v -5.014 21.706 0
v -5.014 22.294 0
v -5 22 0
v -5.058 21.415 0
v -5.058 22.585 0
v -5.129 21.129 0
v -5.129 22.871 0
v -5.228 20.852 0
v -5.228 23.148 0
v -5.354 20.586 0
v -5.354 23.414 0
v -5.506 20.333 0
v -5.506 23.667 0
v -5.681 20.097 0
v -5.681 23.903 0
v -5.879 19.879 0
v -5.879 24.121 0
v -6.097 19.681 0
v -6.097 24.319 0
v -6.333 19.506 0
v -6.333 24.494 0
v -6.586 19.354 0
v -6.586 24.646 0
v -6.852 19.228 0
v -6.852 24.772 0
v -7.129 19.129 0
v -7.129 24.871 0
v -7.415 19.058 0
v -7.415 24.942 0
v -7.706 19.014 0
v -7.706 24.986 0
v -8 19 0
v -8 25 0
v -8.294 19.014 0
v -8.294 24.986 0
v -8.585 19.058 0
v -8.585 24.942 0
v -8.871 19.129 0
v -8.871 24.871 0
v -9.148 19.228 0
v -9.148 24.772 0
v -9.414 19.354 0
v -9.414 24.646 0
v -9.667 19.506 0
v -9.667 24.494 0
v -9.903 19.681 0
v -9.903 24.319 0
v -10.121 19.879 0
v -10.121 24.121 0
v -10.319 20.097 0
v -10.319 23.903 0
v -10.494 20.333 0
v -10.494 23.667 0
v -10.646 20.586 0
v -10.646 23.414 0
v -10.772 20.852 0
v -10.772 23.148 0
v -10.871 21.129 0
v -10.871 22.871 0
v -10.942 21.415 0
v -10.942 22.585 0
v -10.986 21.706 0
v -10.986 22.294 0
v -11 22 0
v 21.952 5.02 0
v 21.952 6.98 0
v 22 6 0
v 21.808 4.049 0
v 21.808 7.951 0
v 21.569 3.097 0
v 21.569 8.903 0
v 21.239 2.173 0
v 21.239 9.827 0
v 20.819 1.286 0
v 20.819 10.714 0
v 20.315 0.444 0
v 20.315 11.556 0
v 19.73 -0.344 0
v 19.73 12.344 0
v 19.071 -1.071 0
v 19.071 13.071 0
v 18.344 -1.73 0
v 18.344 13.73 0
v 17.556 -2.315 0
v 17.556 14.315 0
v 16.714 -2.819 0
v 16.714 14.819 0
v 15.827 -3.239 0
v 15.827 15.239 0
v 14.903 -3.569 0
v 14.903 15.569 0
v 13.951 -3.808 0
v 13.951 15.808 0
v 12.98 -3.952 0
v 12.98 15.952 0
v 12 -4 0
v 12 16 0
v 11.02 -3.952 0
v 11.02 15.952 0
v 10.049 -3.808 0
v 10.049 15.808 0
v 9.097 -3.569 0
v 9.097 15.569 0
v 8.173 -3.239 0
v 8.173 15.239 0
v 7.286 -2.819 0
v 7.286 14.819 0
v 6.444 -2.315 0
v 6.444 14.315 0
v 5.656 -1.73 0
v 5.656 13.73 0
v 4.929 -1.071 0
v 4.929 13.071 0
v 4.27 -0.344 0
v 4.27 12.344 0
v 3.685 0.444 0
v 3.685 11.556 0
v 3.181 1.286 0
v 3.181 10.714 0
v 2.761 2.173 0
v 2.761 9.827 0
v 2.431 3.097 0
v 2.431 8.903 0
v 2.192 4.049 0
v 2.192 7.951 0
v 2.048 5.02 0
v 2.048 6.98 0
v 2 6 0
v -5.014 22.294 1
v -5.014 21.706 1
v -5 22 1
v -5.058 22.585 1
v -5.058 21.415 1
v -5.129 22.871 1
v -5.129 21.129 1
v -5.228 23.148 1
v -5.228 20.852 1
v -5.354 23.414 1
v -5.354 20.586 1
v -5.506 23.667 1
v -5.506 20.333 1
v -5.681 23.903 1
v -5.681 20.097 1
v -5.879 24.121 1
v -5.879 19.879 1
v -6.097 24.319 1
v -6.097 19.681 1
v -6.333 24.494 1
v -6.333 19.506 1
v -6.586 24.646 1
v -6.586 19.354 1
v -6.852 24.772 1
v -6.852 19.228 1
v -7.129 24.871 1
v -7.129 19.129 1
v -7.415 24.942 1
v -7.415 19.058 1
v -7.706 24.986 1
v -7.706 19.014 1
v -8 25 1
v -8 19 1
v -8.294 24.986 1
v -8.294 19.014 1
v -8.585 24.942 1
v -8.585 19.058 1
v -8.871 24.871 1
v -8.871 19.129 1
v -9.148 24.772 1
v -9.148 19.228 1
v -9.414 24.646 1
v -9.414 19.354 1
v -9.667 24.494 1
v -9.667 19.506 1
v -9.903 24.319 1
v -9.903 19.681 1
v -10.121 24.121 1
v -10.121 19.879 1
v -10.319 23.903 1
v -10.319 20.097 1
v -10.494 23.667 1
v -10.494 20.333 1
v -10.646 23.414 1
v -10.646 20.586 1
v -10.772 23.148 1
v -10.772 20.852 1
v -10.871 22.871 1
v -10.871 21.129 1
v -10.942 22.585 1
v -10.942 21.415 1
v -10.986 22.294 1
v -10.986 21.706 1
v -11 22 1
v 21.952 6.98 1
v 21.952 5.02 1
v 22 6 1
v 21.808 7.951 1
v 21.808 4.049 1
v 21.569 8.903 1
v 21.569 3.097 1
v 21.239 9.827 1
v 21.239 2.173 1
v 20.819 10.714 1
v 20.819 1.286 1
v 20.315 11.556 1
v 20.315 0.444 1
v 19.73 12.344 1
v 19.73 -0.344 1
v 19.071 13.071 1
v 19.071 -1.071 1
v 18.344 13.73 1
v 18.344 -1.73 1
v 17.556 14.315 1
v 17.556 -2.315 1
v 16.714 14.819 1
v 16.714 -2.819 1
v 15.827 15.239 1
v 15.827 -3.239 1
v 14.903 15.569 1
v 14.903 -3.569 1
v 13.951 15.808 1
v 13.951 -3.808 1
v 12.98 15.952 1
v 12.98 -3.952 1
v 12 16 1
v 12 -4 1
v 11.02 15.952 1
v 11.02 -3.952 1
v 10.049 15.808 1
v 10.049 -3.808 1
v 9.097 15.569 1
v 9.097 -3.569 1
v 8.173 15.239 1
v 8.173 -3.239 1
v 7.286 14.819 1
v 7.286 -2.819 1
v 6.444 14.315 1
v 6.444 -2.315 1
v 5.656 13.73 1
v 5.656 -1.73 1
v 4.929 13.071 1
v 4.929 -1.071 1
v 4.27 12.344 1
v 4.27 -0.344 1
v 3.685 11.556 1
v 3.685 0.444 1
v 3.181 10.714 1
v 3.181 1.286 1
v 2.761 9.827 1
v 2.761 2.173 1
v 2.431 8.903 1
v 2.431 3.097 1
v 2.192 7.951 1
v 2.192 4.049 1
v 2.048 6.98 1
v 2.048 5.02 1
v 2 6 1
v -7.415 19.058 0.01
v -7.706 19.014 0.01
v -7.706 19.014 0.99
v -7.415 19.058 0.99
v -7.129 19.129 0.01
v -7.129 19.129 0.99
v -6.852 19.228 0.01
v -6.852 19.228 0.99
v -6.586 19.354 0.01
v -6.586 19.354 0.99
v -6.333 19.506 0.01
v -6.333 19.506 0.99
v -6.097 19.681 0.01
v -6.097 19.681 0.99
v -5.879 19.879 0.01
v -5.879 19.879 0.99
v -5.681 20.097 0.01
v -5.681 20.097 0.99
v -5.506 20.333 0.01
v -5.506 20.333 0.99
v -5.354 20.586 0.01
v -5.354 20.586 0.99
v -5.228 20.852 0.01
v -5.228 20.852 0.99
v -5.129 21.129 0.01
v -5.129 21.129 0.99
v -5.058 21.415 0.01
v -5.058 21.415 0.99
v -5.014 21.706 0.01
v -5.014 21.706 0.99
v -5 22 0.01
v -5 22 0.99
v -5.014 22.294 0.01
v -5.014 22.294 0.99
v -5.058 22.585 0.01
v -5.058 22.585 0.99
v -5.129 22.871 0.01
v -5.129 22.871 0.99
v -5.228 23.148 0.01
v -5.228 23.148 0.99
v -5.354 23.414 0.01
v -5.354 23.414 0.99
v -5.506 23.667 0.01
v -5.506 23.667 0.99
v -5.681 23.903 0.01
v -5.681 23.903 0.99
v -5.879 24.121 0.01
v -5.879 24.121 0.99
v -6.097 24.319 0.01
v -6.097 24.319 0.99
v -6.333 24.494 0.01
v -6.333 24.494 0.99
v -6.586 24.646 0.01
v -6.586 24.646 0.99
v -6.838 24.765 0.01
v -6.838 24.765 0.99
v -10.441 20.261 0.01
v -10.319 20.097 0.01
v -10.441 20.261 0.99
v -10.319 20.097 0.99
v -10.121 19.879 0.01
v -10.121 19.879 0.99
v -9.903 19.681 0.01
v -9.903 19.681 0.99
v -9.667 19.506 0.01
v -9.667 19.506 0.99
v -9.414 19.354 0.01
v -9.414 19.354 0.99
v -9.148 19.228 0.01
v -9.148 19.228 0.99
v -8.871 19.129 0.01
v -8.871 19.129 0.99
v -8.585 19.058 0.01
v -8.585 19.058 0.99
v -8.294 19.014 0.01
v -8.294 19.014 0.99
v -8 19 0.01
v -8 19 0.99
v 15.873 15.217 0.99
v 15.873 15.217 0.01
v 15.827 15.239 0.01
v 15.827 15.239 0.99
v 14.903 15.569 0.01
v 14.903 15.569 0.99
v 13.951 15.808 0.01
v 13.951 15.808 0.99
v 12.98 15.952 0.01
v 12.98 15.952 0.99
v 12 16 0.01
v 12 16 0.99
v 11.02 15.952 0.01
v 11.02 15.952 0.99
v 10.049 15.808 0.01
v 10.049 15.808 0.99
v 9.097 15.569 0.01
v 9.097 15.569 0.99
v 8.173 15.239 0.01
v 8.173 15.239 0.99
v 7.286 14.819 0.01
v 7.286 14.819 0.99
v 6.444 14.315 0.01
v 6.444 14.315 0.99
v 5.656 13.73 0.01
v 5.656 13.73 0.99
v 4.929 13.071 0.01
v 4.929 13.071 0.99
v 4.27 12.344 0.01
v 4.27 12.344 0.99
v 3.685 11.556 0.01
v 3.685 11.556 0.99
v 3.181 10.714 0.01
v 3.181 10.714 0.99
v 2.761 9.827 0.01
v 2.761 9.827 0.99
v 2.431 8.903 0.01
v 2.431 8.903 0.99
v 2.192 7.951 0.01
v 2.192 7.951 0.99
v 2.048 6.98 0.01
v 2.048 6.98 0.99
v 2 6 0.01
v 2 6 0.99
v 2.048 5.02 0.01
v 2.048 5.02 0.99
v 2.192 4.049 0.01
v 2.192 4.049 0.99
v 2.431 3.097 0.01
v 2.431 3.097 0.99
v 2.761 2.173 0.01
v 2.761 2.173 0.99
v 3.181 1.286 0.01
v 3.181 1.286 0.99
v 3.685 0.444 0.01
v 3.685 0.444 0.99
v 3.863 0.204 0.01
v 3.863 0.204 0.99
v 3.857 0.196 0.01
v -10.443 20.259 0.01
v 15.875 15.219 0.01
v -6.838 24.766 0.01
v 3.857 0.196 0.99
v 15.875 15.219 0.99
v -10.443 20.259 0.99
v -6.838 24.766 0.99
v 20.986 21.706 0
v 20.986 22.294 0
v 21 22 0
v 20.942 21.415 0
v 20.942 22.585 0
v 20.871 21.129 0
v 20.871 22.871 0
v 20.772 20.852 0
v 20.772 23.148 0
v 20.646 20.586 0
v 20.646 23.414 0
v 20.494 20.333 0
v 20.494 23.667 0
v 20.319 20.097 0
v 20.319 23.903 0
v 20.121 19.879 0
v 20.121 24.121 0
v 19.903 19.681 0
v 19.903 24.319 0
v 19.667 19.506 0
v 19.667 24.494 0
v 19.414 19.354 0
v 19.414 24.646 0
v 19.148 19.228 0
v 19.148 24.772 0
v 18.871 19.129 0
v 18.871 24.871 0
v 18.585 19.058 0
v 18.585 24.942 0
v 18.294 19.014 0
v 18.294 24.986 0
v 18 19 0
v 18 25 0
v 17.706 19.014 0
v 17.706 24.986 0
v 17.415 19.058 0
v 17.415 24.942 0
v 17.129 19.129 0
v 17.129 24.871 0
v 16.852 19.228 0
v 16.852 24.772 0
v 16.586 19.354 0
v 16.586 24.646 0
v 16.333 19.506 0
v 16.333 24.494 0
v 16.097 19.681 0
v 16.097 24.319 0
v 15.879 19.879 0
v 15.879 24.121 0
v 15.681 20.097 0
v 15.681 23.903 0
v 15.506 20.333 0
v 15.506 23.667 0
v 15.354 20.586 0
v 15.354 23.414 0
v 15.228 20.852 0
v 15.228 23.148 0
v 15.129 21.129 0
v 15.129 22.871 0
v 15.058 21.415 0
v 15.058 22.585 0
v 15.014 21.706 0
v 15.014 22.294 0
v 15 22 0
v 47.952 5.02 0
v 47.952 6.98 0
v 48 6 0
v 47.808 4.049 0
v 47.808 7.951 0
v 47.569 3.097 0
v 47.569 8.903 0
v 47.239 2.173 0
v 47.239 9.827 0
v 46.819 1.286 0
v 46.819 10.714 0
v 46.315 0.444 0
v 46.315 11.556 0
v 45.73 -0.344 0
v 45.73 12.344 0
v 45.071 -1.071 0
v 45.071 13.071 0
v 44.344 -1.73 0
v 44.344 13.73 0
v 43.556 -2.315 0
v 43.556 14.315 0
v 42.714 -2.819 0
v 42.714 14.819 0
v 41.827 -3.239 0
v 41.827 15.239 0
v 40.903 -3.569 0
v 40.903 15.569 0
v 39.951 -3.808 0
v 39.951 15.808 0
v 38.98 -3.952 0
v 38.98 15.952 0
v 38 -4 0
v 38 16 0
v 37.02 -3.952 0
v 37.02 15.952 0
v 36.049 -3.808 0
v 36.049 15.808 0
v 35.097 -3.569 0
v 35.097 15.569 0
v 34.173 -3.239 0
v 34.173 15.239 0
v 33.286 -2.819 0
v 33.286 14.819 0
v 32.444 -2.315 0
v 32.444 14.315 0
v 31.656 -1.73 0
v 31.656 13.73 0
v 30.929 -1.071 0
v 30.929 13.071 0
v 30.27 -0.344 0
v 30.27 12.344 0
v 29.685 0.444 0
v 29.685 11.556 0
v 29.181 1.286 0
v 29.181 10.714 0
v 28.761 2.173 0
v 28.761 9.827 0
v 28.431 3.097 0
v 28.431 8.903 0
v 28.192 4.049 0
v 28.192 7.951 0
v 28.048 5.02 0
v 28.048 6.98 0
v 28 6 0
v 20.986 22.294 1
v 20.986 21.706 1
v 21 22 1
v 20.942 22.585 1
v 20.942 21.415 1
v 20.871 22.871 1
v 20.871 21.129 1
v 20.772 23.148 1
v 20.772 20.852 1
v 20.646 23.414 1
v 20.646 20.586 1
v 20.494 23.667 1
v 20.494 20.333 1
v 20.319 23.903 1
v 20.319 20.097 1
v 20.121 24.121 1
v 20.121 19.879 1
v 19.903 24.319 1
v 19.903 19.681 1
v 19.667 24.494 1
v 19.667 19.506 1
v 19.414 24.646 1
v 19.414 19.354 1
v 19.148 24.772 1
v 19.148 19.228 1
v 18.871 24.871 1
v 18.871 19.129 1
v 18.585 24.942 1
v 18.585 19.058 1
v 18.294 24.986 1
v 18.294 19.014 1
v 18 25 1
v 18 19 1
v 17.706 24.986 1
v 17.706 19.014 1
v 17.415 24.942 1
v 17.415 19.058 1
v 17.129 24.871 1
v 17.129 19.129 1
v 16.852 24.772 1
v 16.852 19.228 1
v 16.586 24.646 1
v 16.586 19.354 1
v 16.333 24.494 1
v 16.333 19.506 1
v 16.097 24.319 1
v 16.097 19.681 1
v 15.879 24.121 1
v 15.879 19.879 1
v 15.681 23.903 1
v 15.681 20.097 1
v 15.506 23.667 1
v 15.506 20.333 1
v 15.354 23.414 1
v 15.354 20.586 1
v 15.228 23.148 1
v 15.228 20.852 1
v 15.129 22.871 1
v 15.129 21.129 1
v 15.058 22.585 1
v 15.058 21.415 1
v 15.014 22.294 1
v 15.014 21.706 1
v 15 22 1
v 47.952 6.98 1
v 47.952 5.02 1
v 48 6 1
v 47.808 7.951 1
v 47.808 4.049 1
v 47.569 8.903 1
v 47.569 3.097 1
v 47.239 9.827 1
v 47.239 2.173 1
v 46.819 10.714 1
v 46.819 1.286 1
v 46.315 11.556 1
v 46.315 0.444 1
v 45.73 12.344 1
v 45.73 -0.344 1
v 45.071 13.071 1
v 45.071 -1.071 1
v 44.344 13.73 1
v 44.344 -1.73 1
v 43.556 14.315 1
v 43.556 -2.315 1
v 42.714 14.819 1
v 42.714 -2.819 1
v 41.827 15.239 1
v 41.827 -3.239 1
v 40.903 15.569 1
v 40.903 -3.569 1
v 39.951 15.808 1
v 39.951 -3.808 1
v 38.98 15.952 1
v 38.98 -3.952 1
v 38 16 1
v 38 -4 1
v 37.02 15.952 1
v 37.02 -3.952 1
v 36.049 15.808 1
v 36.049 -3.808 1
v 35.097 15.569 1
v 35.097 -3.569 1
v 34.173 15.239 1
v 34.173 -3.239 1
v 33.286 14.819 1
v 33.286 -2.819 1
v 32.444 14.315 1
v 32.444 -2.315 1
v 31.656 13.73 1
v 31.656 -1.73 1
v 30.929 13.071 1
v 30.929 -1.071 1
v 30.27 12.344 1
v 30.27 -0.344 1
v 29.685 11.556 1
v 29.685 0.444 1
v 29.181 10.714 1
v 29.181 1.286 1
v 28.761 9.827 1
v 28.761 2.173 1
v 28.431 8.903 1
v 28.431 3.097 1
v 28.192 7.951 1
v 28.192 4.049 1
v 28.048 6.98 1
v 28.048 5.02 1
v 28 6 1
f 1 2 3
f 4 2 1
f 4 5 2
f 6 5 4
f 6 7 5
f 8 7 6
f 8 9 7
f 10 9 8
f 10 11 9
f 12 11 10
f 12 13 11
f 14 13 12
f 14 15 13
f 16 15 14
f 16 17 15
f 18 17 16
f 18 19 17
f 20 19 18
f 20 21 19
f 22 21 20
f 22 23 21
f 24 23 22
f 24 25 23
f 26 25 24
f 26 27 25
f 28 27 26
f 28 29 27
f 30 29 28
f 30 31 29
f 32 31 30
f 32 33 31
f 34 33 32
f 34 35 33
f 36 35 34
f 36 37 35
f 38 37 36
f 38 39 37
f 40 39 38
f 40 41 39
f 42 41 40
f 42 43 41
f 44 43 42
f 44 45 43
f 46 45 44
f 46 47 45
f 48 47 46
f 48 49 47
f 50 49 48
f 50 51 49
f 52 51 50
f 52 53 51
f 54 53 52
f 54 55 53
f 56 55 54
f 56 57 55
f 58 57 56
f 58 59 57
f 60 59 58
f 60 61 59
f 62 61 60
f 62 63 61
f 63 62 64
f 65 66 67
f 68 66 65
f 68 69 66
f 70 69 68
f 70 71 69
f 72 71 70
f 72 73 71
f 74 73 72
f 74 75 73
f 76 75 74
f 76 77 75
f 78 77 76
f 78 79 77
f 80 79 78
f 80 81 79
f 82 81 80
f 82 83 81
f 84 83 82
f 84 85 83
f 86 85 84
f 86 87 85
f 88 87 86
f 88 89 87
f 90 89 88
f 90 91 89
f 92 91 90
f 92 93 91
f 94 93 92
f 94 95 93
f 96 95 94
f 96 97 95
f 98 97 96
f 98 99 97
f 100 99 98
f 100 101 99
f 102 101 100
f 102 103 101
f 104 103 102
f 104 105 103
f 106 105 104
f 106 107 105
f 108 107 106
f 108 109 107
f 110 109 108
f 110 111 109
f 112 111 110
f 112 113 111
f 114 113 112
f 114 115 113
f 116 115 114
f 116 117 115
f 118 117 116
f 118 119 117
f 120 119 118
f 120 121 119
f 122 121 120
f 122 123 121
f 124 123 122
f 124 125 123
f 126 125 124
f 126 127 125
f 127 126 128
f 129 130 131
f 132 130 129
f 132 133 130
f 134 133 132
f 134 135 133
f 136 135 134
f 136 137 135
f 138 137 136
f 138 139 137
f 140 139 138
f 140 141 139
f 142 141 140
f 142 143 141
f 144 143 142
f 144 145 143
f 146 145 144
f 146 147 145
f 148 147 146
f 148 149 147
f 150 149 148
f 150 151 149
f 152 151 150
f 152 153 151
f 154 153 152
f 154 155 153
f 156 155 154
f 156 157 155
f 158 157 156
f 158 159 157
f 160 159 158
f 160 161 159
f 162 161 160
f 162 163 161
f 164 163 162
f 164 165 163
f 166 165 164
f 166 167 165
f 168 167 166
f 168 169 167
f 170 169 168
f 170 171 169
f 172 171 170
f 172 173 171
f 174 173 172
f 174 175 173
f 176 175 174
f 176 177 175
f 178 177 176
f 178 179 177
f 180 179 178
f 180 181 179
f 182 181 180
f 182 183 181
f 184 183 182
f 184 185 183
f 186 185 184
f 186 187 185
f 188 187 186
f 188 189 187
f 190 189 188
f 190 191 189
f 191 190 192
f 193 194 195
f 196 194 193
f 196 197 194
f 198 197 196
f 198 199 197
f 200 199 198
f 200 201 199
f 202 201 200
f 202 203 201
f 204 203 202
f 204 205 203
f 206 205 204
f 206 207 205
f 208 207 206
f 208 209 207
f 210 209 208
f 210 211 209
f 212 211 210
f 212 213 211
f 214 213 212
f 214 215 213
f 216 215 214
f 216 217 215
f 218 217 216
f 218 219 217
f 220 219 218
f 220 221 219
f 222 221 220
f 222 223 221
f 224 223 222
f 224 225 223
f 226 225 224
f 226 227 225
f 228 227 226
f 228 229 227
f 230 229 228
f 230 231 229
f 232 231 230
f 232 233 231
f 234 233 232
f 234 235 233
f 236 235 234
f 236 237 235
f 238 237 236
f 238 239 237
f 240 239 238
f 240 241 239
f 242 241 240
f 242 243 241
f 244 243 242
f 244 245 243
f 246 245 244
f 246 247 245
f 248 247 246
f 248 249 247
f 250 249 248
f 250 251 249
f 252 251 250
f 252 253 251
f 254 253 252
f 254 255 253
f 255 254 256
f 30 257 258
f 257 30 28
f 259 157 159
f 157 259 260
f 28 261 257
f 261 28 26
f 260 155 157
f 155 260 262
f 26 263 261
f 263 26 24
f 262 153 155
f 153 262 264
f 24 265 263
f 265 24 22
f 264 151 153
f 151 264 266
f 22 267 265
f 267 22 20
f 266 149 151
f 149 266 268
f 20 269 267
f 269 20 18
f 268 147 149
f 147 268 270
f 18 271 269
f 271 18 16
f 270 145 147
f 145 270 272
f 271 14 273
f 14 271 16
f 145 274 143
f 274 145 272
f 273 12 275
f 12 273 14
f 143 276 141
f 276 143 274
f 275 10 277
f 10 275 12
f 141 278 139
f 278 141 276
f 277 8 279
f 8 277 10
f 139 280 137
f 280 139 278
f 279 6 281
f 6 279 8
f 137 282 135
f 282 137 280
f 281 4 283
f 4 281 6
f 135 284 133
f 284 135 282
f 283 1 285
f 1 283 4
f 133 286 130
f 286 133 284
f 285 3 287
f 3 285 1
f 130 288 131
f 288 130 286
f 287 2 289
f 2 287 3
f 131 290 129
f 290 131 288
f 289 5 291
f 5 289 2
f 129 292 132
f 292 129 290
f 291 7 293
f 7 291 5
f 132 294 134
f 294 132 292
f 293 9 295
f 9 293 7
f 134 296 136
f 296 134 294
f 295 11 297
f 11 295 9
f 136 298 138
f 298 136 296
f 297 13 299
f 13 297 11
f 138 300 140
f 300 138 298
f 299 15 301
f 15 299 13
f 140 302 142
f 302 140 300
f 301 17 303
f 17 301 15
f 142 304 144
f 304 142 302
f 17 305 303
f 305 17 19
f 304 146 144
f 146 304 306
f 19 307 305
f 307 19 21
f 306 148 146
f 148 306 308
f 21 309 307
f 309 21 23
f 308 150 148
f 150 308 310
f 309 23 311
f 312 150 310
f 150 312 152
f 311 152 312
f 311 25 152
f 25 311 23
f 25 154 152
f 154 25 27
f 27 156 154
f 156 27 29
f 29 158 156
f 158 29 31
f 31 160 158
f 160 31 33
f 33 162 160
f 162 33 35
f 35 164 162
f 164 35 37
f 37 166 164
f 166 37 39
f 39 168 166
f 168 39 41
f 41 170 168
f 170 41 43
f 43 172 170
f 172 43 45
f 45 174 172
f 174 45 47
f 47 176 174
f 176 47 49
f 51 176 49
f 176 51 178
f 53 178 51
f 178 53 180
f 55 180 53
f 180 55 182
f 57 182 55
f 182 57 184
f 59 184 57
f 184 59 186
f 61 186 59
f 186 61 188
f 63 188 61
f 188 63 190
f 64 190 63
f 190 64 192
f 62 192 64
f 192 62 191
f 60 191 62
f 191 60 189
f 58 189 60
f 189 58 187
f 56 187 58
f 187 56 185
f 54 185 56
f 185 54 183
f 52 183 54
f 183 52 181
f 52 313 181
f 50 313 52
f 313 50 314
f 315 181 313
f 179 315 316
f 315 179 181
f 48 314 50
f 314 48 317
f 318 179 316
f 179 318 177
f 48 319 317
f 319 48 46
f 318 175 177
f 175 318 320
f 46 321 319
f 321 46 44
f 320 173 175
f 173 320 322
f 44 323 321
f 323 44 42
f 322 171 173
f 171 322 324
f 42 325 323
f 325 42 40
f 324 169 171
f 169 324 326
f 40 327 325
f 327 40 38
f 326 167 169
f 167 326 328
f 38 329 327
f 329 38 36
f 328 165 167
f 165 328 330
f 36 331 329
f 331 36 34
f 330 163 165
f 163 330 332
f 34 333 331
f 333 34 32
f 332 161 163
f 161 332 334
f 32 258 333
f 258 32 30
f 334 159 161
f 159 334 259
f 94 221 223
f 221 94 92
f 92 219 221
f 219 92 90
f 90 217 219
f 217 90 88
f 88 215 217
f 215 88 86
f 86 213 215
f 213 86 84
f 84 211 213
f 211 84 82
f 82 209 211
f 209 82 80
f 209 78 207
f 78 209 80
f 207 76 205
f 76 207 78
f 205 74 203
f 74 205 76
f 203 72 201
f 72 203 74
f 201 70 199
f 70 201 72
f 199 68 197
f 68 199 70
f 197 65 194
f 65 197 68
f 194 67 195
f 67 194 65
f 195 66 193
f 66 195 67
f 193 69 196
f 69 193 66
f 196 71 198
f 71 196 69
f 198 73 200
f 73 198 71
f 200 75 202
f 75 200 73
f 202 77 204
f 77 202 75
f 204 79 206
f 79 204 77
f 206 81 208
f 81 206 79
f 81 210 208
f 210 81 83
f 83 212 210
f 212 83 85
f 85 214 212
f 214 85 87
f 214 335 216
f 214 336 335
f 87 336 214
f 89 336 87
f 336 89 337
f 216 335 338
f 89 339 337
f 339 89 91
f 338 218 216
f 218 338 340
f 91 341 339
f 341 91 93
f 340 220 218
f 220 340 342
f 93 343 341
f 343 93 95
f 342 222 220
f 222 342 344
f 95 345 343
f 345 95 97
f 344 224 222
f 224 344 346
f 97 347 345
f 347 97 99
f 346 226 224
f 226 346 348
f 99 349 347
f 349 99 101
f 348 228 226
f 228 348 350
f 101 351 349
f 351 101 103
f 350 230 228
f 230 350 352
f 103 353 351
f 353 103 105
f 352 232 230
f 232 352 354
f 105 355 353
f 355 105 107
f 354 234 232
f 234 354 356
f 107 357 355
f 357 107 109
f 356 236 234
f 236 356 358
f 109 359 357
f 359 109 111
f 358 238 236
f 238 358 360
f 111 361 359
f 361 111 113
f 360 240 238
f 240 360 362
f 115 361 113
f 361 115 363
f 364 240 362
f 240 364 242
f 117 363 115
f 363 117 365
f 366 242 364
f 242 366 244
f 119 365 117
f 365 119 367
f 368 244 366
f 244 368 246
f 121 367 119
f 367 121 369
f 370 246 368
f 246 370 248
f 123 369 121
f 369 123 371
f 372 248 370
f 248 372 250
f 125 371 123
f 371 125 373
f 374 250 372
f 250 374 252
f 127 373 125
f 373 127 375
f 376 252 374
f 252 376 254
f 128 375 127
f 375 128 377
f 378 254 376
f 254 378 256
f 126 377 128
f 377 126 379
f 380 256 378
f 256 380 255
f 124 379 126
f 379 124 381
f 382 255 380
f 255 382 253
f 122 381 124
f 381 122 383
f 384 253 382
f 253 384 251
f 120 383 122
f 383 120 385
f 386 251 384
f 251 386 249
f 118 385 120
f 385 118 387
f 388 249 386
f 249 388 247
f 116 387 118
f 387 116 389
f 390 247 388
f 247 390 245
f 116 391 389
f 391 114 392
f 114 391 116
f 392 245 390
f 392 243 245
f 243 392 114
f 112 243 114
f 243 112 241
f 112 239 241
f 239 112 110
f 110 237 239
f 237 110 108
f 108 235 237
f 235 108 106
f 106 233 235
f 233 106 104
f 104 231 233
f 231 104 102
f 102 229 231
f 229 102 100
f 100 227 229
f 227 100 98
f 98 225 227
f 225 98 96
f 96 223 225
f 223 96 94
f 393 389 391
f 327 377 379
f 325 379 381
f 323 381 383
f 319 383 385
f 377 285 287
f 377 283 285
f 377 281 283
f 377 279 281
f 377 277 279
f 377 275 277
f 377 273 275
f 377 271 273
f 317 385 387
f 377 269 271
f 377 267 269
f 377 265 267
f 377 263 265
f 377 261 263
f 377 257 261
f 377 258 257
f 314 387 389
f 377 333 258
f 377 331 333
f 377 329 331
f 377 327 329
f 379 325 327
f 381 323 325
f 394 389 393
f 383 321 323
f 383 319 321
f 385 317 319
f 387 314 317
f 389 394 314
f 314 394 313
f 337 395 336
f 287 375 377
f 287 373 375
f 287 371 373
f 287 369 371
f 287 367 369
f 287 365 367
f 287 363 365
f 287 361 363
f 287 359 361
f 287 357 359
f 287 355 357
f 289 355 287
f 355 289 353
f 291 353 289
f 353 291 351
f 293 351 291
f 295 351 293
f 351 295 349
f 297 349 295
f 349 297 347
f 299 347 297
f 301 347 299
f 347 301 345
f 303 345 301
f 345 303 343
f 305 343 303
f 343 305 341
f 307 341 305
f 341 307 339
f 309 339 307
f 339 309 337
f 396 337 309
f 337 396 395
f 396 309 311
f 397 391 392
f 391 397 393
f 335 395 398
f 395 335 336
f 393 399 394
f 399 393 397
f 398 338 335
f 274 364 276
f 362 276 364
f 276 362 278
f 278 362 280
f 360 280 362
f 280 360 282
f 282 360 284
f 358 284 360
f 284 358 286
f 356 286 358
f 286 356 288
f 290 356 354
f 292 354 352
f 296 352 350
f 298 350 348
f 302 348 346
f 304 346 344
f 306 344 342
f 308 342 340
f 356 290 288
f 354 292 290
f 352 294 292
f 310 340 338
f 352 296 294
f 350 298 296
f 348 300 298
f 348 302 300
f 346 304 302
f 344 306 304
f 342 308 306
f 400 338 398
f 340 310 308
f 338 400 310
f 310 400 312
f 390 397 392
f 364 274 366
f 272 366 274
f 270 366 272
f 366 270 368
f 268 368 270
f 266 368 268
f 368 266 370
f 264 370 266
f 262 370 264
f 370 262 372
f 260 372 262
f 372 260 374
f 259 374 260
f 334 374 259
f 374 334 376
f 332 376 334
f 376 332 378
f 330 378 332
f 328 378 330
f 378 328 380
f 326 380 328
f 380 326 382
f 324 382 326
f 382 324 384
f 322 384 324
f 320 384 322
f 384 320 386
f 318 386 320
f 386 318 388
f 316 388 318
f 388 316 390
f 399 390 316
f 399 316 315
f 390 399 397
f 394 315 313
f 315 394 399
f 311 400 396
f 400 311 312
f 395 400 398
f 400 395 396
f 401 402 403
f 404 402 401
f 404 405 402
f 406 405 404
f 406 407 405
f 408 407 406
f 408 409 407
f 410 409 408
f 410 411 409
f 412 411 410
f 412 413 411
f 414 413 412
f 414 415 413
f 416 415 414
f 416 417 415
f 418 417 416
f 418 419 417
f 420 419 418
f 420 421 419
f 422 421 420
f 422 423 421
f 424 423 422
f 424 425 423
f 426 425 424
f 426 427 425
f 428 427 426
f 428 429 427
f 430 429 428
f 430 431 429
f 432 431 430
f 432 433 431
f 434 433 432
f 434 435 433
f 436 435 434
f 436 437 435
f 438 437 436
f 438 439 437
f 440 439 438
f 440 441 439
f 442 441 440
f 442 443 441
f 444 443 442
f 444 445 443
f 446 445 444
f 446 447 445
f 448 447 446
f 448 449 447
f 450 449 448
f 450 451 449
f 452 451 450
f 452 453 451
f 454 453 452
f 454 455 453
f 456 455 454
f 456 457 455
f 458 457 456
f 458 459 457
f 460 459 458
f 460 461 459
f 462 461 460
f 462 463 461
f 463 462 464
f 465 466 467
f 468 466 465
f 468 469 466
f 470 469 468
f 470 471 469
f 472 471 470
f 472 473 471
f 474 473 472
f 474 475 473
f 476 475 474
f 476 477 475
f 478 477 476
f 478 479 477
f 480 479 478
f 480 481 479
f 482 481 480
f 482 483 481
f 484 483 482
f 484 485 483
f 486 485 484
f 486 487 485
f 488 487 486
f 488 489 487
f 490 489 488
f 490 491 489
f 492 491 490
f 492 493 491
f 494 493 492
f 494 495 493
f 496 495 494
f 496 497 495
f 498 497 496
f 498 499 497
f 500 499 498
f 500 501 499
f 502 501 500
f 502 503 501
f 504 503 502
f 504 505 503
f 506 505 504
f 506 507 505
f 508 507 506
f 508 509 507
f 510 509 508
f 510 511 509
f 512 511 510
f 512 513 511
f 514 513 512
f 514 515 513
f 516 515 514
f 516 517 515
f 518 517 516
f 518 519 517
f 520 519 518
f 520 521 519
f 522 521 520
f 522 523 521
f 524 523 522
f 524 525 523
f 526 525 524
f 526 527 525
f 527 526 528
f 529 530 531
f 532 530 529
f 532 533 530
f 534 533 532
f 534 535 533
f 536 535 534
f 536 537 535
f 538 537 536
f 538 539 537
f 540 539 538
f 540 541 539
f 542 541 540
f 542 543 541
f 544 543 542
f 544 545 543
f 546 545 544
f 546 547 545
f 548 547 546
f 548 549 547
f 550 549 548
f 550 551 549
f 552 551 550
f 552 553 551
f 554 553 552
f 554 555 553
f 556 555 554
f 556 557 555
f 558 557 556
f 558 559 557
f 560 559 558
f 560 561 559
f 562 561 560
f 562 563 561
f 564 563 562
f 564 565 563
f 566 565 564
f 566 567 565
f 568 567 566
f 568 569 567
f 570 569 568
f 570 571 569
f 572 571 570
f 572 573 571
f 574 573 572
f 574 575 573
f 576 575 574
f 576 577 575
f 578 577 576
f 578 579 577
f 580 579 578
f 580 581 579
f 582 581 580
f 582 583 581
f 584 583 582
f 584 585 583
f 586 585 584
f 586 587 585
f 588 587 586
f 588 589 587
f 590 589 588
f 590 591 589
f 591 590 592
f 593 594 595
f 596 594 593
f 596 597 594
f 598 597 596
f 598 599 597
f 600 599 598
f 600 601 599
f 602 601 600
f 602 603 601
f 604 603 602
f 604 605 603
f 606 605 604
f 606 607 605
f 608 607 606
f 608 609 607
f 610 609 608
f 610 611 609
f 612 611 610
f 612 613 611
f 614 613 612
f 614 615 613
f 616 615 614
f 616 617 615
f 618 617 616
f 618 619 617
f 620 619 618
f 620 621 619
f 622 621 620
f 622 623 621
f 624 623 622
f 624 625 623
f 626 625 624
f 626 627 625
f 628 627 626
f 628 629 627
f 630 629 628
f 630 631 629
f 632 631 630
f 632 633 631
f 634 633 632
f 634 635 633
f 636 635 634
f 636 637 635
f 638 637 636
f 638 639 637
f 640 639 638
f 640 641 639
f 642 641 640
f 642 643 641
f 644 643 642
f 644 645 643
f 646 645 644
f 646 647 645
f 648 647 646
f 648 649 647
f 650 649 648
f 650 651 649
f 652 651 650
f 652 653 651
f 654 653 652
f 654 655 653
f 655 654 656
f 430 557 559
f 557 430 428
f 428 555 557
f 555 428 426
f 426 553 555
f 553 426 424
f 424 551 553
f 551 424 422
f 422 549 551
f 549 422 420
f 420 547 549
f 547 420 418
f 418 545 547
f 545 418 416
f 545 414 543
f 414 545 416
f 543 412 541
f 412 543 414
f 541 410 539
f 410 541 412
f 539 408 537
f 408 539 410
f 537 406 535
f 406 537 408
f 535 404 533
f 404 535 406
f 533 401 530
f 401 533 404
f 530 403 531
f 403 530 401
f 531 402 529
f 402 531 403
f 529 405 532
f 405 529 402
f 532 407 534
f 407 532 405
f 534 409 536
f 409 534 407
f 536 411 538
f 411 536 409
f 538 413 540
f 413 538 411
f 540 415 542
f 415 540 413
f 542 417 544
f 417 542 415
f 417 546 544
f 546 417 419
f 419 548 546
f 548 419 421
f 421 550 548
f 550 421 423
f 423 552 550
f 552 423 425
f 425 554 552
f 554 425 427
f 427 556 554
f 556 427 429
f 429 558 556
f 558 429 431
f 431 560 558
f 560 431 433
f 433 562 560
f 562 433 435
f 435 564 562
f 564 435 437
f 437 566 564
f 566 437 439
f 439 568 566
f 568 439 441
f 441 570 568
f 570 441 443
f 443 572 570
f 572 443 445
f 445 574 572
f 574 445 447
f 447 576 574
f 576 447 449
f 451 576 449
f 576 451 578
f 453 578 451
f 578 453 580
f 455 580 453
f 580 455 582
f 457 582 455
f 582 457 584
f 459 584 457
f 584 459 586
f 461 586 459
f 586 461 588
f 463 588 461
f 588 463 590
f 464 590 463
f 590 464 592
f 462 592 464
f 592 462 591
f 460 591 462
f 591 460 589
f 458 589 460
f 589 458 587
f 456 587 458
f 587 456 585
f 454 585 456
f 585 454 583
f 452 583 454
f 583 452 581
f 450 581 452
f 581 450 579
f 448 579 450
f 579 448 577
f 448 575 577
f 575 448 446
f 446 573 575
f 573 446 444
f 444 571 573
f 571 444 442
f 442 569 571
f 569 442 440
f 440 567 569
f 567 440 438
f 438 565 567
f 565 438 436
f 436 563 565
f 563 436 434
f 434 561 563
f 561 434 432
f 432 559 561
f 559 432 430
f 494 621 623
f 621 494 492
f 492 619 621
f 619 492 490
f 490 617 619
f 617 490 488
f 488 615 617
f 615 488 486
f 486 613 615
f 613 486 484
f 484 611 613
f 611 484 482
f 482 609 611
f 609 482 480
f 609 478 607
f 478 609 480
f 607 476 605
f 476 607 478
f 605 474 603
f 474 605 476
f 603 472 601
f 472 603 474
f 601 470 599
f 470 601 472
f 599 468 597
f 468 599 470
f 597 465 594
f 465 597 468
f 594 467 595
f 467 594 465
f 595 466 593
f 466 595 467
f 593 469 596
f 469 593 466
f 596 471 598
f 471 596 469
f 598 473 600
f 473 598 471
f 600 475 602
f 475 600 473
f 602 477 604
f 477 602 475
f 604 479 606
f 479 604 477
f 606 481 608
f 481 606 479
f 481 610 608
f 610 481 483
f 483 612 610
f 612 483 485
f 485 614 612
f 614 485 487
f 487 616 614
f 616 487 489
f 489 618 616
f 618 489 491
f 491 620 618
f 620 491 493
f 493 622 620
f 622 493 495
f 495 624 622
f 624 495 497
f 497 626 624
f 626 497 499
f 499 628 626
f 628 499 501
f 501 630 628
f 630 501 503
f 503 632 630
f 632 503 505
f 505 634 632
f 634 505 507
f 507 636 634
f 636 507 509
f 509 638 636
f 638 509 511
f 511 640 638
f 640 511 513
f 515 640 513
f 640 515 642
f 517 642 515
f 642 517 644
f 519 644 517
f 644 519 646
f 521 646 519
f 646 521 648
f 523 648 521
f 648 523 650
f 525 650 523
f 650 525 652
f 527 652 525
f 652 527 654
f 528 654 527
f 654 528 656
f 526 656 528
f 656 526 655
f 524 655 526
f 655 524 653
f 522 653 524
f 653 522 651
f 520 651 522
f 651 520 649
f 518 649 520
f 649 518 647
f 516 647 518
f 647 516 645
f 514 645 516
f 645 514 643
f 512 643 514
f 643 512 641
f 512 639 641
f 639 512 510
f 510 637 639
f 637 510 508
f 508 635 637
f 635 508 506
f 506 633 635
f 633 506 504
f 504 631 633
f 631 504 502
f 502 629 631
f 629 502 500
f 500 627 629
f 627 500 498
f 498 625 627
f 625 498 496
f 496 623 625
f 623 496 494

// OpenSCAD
// Tangent points of two circles
// Sources
// http://www.ambrsoft.com/TrigoCalc/Circles2/Circles2Tangent_.htm
// http://mathworld.wolfram.com/Circle-CircleTangents.html

function sqr(x) = pow(x,2);
function sqrt(x) = pow(x, 1/2);

function getx(c, r, sc, s=1) =	let (cx=c[0], cy=c[1], px=sc[0], py=sc[1]) ((sqr(r)*(px-cx)+(s*r*(py-cy)*sqrt(sqr(px-cx)+sqr(py-cy)-sqr(r)))) /
			(sqr(px-cx)+sqr(py-cy)))
			+cx;

function gety(c, r, sc, s=1) =	let (cx=c[0], cy=c[1], px=sc[0], py=sc[1]) ((sqr(r)*(py-cy)+(s*r*(px-cx)*sqrt(sqr(px-cx)+sqr(py-cy)-sqr(r)))) /
			(sqr(px-cx)+sqr(py-cy)))
			+cy;
			
// Get center of similitude, either internal or external		
// s=-1 for external and 1 for internal
function GetSimCentre (c0, r0, c1, r1, s=-1) = let (a=c0[0], b=c0[1], c=c1[0], d=c1[1]) [(c*r0+s*a*r1)/(r0+s*r1), (d*r0+s*b*r1)/(r0+s*r1)];

// c=centre of circle, r=radius, sc=center of similitude
// s selects which tangent point on circle depending on whether 1 or -1
function GetTangent (c, r, sc, s=1) = [getx(c, r, sc, s), gety(c, r, sc, s=-s)];

// test
$fn = 64;

// Some test circles
c0 = [25, 6];
r0 = 10;
c1 = [5, 22];
r1 = 3;

// Show circles with both internal and etxernal points of similitude
for (whichsc = [-1, 1]) translate ([(r0+r1)*1*whichsc, 0, 0]) {
	// Get center of similitude, either internal or external		
	// s=-1 for external and 1 for internal
	sc = GetSimCentre(c0, r0, c1, r1, s=whichsc); 

	// Points on C0
	t0 = GetTangent(c0, r0, sc, s=1);
	t1 = GetTangent(c0, r0, sc, s=-1);

	// Points on C1
	t2 = GetTangent(c1, r1, sc, s=1);
	t3 = GetTangent(c1, r1, sc, s=-1);

	// Show circles
	linear_extrude (height=1) {
		translate (c0) circle (r=r0);
		translate (c1) circle (r=r1);
	}

	/*  Points just for debug
	translate (sc) color ("blue") circle (r=1);
	translate (t0) color ("blue") circle (r=1);
	translate (t1) color ("blue") circle (r=1);
	translate (t2) color ("blue") circle (r=1);
	translate (t3) color ("blue") circle (r=1);
	*/
	
	// Show "fillet" based on point of similitude
	translate ([0, 0, 0.01]) color("red") linear_extrude (height=0.98) polygon ([t0, t2, t3, t1]);
}
